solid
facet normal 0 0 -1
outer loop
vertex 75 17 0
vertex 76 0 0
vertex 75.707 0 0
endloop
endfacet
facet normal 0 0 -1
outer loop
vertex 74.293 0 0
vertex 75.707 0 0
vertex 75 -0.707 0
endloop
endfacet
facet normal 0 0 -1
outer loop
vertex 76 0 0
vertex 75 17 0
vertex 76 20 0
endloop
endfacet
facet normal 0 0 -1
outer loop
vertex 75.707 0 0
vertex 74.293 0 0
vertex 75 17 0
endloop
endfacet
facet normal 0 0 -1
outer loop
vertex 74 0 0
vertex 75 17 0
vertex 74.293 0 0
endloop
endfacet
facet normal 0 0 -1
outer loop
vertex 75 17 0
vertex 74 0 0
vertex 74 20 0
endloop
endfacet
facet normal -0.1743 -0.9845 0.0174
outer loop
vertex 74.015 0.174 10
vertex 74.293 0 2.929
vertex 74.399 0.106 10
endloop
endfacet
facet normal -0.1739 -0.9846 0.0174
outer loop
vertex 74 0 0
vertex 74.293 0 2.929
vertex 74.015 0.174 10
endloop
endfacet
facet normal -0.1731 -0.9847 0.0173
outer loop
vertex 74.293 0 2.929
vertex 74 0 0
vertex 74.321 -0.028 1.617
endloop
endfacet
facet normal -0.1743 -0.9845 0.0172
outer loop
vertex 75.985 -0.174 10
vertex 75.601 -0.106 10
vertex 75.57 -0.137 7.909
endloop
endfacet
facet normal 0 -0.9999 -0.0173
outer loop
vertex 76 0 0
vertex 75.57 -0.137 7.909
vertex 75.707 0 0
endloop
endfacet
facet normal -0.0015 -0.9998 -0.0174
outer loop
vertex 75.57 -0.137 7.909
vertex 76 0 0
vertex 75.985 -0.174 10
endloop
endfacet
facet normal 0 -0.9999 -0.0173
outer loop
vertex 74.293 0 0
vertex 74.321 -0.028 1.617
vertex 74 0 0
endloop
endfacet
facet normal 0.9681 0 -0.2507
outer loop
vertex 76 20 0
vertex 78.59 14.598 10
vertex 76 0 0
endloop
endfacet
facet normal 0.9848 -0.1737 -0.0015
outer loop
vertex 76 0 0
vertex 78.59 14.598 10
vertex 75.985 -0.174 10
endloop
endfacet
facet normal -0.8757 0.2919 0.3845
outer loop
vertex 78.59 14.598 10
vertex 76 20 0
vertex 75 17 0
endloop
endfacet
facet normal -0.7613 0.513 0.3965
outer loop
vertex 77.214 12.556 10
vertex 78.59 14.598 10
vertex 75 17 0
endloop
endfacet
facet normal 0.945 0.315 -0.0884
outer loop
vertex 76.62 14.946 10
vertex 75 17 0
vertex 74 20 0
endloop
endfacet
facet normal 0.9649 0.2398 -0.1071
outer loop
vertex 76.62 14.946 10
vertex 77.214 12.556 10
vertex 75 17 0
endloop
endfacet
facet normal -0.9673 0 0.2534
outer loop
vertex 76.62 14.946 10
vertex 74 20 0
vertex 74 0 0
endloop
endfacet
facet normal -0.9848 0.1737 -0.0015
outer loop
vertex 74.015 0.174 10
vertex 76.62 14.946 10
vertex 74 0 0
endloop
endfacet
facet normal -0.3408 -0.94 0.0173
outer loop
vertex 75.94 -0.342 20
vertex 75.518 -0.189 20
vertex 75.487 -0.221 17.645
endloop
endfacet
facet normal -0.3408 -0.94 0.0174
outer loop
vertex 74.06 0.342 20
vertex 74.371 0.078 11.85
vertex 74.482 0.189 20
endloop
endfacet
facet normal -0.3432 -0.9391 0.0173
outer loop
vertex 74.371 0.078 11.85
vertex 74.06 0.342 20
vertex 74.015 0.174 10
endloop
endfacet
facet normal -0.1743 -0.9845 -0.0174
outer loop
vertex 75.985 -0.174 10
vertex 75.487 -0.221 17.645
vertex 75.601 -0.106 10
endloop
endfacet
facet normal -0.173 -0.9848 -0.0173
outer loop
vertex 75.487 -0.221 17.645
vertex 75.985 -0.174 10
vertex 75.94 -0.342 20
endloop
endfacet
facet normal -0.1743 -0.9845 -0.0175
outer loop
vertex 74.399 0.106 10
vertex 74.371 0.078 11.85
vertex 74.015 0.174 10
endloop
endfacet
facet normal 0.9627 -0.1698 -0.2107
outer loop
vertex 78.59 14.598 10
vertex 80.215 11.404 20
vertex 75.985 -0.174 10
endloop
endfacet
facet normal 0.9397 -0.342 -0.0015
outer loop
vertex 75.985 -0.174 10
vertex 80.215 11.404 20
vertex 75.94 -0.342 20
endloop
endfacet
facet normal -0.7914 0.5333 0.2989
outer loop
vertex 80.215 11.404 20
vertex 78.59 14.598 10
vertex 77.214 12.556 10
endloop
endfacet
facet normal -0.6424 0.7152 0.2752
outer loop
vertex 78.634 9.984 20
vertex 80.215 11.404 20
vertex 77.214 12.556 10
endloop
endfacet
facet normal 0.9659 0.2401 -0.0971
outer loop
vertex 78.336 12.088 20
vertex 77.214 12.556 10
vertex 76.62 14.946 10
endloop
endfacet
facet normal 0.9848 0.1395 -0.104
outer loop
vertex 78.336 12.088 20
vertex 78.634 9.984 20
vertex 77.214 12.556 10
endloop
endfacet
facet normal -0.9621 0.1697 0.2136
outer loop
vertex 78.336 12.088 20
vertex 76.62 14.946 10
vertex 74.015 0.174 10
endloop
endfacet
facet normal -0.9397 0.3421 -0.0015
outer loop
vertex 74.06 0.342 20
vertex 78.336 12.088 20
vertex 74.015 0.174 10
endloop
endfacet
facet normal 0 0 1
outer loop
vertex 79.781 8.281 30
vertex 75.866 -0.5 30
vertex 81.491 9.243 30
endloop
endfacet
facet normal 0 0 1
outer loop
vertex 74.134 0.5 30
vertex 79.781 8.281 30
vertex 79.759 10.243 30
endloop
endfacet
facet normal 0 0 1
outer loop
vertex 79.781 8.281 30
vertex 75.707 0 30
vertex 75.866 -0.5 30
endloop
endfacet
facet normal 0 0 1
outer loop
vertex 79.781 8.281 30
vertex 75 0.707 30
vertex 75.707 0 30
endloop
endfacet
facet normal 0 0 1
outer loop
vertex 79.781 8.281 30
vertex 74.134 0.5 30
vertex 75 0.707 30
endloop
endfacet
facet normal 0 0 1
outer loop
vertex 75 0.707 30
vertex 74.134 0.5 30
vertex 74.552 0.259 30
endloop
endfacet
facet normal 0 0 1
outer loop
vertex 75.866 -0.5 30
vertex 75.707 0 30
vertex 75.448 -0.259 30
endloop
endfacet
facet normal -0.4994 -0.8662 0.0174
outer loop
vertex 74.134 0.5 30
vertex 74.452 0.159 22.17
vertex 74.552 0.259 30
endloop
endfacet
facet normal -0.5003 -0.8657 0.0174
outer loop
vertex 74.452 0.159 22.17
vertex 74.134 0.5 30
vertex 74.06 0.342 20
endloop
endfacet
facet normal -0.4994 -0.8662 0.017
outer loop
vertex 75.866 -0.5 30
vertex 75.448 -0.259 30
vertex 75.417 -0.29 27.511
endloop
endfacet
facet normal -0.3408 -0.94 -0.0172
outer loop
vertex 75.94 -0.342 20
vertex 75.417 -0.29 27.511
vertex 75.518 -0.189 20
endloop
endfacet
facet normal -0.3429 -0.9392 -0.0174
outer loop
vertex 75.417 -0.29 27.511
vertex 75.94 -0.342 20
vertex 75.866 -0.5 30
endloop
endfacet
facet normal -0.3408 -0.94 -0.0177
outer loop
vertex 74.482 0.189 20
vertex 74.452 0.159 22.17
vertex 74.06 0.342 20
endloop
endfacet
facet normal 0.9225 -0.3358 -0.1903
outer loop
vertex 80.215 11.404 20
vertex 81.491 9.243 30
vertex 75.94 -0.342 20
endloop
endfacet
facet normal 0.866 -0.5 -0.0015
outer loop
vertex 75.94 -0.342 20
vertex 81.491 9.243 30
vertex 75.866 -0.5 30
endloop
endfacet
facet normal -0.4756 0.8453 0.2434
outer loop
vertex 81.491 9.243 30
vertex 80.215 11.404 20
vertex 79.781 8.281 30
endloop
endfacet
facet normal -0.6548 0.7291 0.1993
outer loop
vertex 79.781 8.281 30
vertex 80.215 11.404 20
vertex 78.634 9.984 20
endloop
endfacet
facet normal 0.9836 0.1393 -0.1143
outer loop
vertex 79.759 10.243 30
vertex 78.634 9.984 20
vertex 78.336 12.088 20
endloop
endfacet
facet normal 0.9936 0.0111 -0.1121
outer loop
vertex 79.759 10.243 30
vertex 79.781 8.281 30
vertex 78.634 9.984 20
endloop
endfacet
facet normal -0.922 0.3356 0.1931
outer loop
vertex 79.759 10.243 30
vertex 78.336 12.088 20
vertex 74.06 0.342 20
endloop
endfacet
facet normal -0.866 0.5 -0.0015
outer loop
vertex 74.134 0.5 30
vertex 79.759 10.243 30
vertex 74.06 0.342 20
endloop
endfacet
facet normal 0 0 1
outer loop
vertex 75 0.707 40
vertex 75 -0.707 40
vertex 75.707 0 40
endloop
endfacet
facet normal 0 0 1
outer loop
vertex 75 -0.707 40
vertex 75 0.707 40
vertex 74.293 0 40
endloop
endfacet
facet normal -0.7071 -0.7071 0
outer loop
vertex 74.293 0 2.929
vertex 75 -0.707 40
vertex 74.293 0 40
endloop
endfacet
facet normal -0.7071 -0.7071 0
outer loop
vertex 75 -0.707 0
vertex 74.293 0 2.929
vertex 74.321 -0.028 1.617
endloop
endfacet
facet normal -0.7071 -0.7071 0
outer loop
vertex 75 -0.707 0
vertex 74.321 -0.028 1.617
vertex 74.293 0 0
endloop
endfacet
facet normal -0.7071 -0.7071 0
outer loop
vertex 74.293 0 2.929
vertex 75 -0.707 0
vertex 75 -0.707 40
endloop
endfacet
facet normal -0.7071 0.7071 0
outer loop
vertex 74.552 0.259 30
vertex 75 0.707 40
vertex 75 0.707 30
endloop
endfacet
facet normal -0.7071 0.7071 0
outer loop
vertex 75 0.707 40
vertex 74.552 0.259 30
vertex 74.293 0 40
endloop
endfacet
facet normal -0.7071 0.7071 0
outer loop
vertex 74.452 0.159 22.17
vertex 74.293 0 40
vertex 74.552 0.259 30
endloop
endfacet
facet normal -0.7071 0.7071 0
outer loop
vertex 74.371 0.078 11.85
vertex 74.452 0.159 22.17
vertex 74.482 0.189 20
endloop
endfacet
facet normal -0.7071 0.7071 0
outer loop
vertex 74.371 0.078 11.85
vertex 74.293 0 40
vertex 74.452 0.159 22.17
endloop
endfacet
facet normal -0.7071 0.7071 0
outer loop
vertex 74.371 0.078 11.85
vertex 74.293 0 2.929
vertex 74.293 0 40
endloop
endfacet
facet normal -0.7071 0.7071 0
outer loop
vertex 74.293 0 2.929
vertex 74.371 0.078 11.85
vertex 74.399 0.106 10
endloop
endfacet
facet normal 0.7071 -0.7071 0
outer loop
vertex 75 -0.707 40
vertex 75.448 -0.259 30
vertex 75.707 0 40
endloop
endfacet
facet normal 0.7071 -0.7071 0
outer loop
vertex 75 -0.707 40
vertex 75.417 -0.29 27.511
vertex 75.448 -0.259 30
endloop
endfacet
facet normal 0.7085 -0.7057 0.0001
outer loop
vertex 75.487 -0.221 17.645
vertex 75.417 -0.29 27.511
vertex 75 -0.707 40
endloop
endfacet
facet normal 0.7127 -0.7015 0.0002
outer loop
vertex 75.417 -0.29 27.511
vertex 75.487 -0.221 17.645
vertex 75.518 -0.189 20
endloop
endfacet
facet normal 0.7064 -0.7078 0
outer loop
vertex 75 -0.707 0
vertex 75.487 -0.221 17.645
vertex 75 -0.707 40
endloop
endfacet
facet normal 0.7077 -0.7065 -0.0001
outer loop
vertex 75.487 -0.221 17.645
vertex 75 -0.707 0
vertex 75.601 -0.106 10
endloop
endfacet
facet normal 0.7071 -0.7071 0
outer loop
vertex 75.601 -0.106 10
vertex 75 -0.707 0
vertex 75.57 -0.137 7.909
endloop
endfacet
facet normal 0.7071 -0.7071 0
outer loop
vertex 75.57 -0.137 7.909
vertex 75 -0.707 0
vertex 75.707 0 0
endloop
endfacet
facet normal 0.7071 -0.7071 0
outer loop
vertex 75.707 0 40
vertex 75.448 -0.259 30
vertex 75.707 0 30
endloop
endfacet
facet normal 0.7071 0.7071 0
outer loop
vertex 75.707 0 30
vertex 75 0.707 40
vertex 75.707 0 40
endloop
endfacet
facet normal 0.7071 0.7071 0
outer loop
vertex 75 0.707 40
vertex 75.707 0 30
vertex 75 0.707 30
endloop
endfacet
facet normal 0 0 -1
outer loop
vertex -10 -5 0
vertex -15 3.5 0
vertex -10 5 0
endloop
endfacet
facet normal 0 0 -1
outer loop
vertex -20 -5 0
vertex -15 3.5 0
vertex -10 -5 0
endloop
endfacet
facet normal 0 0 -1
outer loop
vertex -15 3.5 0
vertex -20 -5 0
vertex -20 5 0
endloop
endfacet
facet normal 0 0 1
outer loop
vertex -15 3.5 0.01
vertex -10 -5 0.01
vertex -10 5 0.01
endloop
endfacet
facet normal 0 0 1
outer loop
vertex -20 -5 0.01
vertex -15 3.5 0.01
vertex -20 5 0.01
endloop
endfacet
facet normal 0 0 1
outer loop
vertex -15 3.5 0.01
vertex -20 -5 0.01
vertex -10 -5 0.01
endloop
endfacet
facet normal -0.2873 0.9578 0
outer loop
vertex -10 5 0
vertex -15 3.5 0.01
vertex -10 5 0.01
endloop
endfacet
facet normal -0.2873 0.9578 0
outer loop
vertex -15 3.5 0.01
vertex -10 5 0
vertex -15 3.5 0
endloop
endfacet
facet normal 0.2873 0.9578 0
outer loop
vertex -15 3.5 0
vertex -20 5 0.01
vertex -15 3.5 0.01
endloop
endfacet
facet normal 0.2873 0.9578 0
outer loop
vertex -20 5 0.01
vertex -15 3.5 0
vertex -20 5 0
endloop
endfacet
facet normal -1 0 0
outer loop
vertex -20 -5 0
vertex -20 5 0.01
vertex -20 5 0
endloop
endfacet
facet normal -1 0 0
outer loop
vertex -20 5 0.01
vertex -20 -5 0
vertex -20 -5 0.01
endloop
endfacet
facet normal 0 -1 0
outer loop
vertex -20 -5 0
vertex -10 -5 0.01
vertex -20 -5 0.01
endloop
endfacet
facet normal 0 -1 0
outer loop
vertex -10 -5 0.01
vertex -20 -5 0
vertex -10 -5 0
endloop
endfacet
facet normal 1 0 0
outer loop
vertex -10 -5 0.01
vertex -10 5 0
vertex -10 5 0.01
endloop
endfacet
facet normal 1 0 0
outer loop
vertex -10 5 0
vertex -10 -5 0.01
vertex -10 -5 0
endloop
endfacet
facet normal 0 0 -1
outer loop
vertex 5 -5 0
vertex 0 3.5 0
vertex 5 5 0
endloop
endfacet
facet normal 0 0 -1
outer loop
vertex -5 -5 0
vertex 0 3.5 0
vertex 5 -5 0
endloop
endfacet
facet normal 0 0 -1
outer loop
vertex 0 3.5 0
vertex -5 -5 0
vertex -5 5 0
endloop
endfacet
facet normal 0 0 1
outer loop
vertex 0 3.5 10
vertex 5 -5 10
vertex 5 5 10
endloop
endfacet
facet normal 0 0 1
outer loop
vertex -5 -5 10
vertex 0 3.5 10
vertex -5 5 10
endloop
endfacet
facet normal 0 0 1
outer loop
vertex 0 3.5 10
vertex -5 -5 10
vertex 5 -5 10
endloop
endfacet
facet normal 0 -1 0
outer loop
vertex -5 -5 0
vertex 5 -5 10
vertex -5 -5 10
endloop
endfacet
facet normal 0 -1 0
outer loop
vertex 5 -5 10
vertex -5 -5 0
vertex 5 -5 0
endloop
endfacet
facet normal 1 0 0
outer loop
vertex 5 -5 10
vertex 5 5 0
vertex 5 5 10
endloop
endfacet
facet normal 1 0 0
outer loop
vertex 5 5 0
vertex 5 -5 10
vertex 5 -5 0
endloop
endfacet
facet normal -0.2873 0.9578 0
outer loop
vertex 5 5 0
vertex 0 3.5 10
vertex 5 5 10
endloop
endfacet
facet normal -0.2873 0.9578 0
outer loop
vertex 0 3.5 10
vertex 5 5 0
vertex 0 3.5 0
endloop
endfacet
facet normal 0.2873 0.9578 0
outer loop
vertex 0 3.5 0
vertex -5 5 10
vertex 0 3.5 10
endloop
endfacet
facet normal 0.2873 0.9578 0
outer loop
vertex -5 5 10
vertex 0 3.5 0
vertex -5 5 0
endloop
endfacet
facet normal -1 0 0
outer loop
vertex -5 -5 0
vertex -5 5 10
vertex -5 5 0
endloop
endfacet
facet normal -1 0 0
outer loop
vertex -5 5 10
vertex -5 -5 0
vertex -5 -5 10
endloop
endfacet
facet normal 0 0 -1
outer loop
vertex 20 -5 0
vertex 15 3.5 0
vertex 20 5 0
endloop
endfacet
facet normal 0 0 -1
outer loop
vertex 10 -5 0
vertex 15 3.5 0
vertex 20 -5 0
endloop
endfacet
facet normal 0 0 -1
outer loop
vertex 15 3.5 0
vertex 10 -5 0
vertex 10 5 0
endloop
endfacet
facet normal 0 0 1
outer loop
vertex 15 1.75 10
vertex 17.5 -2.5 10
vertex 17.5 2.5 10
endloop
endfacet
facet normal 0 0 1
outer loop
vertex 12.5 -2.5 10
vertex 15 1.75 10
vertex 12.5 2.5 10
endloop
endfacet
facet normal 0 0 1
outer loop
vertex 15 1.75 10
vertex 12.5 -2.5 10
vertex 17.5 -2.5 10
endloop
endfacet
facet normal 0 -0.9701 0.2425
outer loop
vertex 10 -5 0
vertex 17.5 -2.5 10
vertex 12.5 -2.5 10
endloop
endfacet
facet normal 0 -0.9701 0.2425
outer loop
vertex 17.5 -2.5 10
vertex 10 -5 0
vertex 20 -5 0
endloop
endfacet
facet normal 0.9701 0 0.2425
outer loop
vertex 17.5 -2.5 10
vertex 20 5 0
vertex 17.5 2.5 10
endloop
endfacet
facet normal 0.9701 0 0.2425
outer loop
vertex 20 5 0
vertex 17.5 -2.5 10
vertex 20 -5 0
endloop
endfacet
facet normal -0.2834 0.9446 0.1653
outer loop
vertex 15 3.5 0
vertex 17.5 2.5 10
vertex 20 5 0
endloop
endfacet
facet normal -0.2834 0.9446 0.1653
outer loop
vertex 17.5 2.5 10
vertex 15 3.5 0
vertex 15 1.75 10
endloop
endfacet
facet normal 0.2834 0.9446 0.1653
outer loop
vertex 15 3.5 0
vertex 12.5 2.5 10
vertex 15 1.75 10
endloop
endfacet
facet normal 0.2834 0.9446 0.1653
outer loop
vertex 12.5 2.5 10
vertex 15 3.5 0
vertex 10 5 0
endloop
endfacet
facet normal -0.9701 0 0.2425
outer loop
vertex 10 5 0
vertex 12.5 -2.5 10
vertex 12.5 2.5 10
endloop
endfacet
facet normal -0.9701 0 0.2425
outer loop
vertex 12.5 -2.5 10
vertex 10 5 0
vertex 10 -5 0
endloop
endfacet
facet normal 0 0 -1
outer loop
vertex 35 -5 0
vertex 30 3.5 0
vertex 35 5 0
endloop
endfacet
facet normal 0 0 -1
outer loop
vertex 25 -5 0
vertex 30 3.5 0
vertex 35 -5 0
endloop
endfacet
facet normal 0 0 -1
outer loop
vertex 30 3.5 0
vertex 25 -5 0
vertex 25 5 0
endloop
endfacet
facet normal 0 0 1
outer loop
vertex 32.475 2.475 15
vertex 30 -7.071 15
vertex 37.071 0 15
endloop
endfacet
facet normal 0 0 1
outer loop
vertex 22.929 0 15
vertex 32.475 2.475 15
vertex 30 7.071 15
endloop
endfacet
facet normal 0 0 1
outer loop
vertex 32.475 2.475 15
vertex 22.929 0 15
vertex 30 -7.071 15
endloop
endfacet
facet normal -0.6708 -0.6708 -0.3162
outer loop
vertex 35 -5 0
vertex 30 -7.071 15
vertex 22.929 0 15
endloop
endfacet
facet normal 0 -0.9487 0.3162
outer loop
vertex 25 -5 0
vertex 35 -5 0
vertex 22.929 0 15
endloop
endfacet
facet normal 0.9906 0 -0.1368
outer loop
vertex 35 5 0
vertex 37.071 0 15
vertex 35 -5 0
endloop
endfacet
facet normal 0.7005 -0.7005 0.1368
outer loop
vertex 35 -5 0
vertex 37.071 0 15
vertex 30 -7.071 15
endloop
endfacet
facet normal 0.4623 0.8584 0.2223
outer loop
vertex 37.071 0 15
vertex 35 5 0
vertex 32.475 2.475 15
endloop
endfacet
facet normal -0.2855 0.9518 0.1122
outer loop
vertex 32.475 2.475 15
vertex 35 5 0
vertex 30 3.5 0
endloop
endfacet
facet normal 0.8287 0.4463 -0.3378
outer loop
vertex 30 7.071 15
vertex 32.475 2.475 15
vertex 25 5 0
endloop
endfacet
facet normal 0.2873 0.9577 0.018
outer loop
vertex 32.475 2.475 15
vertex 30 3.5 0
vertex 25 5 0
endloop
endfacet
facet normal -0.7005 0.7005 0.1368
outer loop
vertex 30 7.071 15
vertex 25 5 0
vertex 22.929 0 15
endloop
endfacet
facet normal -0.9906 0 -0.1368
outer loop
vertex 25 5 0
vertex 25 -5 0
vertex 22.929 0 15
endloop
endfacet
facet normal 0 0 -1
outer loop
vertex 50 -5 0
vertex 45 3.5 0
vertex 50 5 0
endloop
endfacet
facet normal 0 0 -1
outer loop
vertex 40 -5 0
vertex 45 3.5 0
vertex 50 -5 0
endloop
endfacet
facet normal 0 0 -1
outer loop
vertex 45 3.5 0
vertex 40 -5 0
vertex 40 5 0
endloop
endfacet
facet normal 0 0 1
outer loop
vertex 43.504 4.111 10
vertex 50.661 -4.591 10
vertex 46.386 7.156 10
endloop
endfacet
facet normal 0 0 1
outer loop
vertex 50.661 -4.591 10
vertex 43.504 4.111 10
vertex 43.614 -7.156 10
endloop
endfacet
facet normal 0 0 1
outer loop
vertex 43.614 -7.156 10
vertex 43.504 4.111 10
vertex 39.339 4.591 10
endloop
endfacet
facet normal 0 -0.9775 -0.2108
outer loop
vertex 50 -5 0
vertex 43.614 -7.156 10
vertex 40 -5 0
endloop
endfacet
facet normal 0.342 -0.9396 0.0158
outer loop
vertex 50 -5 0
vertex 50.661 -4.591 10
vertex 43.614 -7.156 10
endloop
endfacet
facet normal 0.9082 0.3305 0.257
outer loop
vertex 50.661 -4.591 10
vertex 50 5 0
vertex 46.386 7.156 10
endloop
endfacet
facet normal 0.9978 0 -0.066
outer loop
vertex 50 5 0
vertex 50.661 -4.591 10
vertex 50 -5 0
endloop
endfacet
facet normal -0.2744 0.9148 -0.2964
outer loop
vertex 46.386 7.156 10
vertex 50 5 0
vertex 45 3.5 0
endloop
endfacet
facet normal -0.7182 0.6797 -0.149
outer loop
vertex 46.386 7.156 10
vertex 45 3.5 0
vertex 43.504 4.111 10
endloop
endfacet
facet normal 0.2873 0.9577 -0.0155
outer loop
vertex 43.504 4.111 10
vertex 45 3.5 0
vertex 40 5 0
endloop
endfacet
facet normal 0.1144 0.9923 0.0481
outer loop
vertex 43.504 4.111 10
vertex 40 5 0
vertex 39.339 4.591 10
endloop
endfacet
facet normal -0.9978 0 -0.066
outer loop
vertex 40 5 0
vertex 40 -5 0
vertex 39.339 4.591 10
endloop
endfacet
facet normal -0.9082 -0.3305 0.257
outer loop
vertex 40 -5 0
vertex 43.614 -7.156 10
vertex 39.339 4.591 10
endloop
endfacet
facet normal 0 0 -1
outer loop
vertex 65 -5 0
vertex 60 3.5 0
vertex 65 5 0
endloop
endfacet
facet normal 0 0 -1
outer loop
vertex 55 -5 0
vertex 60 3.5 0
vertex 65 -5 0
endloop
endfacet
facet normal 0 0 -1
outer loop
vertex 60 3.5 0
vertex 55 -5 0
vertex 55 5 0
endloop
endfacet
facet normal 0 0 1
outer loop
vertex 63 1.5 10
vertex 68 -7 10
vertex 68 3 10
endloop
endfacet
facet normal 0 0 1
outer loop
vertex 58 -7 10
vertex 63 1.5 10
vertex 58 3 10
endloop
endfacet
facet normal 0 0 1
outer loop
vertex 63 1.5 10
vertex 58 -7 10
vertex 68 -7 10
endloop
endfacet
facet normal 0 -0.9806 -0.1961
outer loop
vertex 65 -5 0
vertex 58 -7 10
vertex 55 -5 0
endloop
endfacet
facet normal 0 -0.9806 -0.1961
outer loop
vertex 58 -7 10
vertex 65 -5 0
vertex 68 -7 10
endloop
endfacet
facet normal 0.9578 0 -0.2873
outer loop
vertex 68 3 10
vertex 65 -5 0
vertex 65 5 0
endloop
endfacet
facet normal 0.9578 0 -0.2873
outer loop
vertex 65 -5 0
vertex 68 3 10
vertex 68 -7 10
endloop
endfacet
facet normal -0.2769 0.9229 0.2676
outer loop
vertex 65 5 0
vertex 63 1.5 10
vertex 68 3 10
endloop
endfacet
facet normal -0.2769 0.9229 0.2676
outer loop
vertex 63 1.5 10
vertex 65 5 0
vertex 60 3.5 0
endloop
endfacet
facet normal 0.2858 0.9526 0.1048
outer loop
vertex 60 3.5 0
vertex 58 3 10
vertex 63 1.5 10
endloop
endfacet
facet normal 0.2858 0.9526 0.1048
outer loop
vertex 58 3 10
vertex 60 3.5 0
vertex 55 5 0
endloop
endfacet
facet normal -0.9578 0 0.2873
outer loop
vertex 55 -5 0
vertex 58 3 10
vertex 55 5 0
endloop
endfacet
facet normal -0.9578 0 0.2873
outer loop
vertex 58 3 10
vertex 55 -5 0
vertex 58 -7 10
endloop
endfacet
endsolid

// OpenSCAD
//# Copyright (C) 2017 Robert Marchese
//
// An alternative to the standard linear extrusion operation.
//
// A list of 2D coordinates is transformed by the given parametes 
// and moved to the z=h plane. The original and transformed set of 
// points are used to generate a polyhedron.
//
// This program is available under the Creative Commons 
// Attribution-ShareAlike License; additional terms may apply. 
// 
// References:
// https://en.wikipedia.org/wiki/Transformation_matrix#Affine_transformations
// https://en.wikibooks.org/wiki/OpenSCAD_User_Manual/Primitive_Solids#polyhedron
//

// Examples
// Test points form a little house shape centered on [0,0]
points = [[-5,-5],[5,-5],[5,5],[0,3.5],[-5,5]];

// debug
 translate([-15,0,0]) linear_extrude(height=.01) polygon(points);

// height 10, no other transforms
alt_extrude(points, 10);

// height 10, top surface scaled to half size
translate([15,0,0]) alt_extrude(points, 10, 0, [.5,.5]);

// height 15, rotated 45 deg counter clockwise
translate([30,0,0]) alt_extrude(points, 15, -45, [1, 1]);

// height 10, rotated 20 deg and scaled 75% in X, 125% in Y
translate([45,0,0]) alt_extrude(points, 10, 20, [.75,1.25]);

// height 10, skewed left x=3 and down 2
translate([60,0,0]) alt_extrude(points, 10, 0, [1,1], [3,-2]);

//chaining twists and scales
translate([75,0,0]) {
    stretch (
        points,
        transform_matrix(0, 0, [.2,2],[0,5]),
        transform_matrix(10, -10, [.2,1.5], [0,5]));
    stretch (
        points,
        transform_matrix(10, -10, [.2,1.5], [0,5]),
        transform_matrix(20, -20, [.2,1.25], [0,5]));
    stretch (
        points,
        transform_matrix(20, -20, [.2,1.25], [0,5]),
        transform_matrix(30, -30, [.2,1.125], [0,5]));
    // narrow reference piece
    rotate([0,0,45]) translate([0,0,20]) cube([1,1,40], center=true);
}
// Examples
//

// Dot product of two vectors of length 3.
function dot(a, b) = a[0]*b[0]+a[1]*b[1]+a[2]*b[2];

// Generates a transfrom matrix from the given paramers
// h - the Z-axis value the polygon is moved to
// a - rotation angle
// s - scale factors, a vector [Sx, Sy]
// t - translation value, a vector [Tx, amd Ty]
// Returns a 3x3 matrix for the Translate, Rotation and 
// Scale transforms (in that order)
/* 
// Apply translate (skew) before other transforms.
// TODO: add 2nd skew parameter to be appied before and after
function transform_matrix(h=0, a=0, s=[1,1], t=[0,0]) = 
    [[s[0]*cos(a), -s[1]*sin(a), t[0]],
     [s[0]*sin(a),  s[1]*cos(a), t[1]],
     [          0,            0, h]];
*/
function transform_matrix(h=0, a=0, s=[1,1], t=[0,0]) =
    [[s[0]*cos(a), -s[1]*sin(a), t[0]*s[0]*cos(a)-t[1]*s[1]*sin(a)],
     [s[0]*sin(a),  s[1]*cos(a), t[0]*s[0]*sin(a)+t[1]*s[1]*cos(a)],
     [          0,            0, h]];

// Stiches together two sets of 2D polygon points seperated to for a 
// polyhedron. The two sets of points are generated by extending the
// original set into 3D (by adding a 3D coordinate, Z=1) and then
// transforming them with the two matricies, m0 and m1. 
module stretch(p2d, m0, m1) {
    n = len(p2d);

    p = [ for(i=[0:n-1]) [p2d[i][0], p2d[i][1], 1] ];

    p0 = [for(i=[0:n-1]) [dot(p[i],m0[0]), dot(p[i],m0[1]), dot(p[i],m0[2])] ];
    p1 = [for(i=[0:n-1]) [dot(p[i],m1[0]), dot(p[i],m1[1]), dot(p[i],m1[2])] ];

    bottom = [[for(i=[0:n-1]) i]];
    top    = [[for(i=[2*n-1:-1:n]) i%(2*n)]];
    sides  = [ for (i=[0:n-1]) [(0+i)%n+n,(1+i)%n+n,(1+i)%n,(0+i)%n]];
    all_faces = concat(bottom, top, sides);

    polyhedron(concat(p0, p1), all_faces);
}


// Form a polygon from the points p. The bottom surfaces is
// and n-gon defined by p while the top surface is generated
// from these by applying transforms given in the parameters
// 
//  p - The set of points forming the base of the polyhedron
//  h - The height of the polyhedron
//  ang-Rotation of the top surface around [0,0]
//  s - A vector length 2 defining the scale factors for x and Y
//  t - A vector defining the translation distance. Note, this
//      transform is applied after all of the others.
//
module alt_extrude(p, h=1, ang=0, s=[1,1], t=[0,0]) {
    translate([0,0,0]) stretch (
        p,
        transform_matrix(),
        transform_matrix(h, ang, s, t));
/*
    n = len(p);

    // Generate the transform matrix for top surface. Could be
    // 2x2, but the last column defines a skew tanslation. 
    M =[[s[0]*cos(ang), -s[1]*sin(ang), t[0]],
        [s[0]*sin(ang),  s[1]*cos(ang), t[1]],
        [            0,              0, 1]];

    // Extend coords for bottom to 3D, using z=1 (see Affine
    // Transforms reference above)
    p0 = [ for(i=[0:n-1]) [p[i][0], p[i][1], 1] ];

    // Apply transform matrix to x and y values of p0. Z value is
    // overwritten since it would be ignored for this 2D transform
    // and it is convenient to do it here.
    p1 = [for(i=[0:n-1]) [dot(p0[i],M[0]), dot(p0[i],M[1]), h+1] ];

    // Each faces is defined by a list of vertcies taken from
    // p0 and p1. The top and bottoms are all the p0 and p1
    // taken in clockwise order when looking at the final polyhedron
    // from outside. The others are two points from p0 and the 
    // corresponding 2 from p1.
    bottom = [[for(i=[0:n-1]) i]];
    top   = [[for(i=[2*n-1:-1:n]) i%(2*n)]];
    sides = [ for (i=[0:n-1]) [(0+i)%n+n,(1+i)%n+n,(1+i)%n,(0+i)%n]];
    all_faces = concat(bottom, top, sides);

    // Generate the polyhedron and translate down 1 unit to compensate
    // for offset used to expand 2D points into 3D
    translate([0,0,-1]) polyhedron(concat(p0, p1), all_faces);
*/
}
